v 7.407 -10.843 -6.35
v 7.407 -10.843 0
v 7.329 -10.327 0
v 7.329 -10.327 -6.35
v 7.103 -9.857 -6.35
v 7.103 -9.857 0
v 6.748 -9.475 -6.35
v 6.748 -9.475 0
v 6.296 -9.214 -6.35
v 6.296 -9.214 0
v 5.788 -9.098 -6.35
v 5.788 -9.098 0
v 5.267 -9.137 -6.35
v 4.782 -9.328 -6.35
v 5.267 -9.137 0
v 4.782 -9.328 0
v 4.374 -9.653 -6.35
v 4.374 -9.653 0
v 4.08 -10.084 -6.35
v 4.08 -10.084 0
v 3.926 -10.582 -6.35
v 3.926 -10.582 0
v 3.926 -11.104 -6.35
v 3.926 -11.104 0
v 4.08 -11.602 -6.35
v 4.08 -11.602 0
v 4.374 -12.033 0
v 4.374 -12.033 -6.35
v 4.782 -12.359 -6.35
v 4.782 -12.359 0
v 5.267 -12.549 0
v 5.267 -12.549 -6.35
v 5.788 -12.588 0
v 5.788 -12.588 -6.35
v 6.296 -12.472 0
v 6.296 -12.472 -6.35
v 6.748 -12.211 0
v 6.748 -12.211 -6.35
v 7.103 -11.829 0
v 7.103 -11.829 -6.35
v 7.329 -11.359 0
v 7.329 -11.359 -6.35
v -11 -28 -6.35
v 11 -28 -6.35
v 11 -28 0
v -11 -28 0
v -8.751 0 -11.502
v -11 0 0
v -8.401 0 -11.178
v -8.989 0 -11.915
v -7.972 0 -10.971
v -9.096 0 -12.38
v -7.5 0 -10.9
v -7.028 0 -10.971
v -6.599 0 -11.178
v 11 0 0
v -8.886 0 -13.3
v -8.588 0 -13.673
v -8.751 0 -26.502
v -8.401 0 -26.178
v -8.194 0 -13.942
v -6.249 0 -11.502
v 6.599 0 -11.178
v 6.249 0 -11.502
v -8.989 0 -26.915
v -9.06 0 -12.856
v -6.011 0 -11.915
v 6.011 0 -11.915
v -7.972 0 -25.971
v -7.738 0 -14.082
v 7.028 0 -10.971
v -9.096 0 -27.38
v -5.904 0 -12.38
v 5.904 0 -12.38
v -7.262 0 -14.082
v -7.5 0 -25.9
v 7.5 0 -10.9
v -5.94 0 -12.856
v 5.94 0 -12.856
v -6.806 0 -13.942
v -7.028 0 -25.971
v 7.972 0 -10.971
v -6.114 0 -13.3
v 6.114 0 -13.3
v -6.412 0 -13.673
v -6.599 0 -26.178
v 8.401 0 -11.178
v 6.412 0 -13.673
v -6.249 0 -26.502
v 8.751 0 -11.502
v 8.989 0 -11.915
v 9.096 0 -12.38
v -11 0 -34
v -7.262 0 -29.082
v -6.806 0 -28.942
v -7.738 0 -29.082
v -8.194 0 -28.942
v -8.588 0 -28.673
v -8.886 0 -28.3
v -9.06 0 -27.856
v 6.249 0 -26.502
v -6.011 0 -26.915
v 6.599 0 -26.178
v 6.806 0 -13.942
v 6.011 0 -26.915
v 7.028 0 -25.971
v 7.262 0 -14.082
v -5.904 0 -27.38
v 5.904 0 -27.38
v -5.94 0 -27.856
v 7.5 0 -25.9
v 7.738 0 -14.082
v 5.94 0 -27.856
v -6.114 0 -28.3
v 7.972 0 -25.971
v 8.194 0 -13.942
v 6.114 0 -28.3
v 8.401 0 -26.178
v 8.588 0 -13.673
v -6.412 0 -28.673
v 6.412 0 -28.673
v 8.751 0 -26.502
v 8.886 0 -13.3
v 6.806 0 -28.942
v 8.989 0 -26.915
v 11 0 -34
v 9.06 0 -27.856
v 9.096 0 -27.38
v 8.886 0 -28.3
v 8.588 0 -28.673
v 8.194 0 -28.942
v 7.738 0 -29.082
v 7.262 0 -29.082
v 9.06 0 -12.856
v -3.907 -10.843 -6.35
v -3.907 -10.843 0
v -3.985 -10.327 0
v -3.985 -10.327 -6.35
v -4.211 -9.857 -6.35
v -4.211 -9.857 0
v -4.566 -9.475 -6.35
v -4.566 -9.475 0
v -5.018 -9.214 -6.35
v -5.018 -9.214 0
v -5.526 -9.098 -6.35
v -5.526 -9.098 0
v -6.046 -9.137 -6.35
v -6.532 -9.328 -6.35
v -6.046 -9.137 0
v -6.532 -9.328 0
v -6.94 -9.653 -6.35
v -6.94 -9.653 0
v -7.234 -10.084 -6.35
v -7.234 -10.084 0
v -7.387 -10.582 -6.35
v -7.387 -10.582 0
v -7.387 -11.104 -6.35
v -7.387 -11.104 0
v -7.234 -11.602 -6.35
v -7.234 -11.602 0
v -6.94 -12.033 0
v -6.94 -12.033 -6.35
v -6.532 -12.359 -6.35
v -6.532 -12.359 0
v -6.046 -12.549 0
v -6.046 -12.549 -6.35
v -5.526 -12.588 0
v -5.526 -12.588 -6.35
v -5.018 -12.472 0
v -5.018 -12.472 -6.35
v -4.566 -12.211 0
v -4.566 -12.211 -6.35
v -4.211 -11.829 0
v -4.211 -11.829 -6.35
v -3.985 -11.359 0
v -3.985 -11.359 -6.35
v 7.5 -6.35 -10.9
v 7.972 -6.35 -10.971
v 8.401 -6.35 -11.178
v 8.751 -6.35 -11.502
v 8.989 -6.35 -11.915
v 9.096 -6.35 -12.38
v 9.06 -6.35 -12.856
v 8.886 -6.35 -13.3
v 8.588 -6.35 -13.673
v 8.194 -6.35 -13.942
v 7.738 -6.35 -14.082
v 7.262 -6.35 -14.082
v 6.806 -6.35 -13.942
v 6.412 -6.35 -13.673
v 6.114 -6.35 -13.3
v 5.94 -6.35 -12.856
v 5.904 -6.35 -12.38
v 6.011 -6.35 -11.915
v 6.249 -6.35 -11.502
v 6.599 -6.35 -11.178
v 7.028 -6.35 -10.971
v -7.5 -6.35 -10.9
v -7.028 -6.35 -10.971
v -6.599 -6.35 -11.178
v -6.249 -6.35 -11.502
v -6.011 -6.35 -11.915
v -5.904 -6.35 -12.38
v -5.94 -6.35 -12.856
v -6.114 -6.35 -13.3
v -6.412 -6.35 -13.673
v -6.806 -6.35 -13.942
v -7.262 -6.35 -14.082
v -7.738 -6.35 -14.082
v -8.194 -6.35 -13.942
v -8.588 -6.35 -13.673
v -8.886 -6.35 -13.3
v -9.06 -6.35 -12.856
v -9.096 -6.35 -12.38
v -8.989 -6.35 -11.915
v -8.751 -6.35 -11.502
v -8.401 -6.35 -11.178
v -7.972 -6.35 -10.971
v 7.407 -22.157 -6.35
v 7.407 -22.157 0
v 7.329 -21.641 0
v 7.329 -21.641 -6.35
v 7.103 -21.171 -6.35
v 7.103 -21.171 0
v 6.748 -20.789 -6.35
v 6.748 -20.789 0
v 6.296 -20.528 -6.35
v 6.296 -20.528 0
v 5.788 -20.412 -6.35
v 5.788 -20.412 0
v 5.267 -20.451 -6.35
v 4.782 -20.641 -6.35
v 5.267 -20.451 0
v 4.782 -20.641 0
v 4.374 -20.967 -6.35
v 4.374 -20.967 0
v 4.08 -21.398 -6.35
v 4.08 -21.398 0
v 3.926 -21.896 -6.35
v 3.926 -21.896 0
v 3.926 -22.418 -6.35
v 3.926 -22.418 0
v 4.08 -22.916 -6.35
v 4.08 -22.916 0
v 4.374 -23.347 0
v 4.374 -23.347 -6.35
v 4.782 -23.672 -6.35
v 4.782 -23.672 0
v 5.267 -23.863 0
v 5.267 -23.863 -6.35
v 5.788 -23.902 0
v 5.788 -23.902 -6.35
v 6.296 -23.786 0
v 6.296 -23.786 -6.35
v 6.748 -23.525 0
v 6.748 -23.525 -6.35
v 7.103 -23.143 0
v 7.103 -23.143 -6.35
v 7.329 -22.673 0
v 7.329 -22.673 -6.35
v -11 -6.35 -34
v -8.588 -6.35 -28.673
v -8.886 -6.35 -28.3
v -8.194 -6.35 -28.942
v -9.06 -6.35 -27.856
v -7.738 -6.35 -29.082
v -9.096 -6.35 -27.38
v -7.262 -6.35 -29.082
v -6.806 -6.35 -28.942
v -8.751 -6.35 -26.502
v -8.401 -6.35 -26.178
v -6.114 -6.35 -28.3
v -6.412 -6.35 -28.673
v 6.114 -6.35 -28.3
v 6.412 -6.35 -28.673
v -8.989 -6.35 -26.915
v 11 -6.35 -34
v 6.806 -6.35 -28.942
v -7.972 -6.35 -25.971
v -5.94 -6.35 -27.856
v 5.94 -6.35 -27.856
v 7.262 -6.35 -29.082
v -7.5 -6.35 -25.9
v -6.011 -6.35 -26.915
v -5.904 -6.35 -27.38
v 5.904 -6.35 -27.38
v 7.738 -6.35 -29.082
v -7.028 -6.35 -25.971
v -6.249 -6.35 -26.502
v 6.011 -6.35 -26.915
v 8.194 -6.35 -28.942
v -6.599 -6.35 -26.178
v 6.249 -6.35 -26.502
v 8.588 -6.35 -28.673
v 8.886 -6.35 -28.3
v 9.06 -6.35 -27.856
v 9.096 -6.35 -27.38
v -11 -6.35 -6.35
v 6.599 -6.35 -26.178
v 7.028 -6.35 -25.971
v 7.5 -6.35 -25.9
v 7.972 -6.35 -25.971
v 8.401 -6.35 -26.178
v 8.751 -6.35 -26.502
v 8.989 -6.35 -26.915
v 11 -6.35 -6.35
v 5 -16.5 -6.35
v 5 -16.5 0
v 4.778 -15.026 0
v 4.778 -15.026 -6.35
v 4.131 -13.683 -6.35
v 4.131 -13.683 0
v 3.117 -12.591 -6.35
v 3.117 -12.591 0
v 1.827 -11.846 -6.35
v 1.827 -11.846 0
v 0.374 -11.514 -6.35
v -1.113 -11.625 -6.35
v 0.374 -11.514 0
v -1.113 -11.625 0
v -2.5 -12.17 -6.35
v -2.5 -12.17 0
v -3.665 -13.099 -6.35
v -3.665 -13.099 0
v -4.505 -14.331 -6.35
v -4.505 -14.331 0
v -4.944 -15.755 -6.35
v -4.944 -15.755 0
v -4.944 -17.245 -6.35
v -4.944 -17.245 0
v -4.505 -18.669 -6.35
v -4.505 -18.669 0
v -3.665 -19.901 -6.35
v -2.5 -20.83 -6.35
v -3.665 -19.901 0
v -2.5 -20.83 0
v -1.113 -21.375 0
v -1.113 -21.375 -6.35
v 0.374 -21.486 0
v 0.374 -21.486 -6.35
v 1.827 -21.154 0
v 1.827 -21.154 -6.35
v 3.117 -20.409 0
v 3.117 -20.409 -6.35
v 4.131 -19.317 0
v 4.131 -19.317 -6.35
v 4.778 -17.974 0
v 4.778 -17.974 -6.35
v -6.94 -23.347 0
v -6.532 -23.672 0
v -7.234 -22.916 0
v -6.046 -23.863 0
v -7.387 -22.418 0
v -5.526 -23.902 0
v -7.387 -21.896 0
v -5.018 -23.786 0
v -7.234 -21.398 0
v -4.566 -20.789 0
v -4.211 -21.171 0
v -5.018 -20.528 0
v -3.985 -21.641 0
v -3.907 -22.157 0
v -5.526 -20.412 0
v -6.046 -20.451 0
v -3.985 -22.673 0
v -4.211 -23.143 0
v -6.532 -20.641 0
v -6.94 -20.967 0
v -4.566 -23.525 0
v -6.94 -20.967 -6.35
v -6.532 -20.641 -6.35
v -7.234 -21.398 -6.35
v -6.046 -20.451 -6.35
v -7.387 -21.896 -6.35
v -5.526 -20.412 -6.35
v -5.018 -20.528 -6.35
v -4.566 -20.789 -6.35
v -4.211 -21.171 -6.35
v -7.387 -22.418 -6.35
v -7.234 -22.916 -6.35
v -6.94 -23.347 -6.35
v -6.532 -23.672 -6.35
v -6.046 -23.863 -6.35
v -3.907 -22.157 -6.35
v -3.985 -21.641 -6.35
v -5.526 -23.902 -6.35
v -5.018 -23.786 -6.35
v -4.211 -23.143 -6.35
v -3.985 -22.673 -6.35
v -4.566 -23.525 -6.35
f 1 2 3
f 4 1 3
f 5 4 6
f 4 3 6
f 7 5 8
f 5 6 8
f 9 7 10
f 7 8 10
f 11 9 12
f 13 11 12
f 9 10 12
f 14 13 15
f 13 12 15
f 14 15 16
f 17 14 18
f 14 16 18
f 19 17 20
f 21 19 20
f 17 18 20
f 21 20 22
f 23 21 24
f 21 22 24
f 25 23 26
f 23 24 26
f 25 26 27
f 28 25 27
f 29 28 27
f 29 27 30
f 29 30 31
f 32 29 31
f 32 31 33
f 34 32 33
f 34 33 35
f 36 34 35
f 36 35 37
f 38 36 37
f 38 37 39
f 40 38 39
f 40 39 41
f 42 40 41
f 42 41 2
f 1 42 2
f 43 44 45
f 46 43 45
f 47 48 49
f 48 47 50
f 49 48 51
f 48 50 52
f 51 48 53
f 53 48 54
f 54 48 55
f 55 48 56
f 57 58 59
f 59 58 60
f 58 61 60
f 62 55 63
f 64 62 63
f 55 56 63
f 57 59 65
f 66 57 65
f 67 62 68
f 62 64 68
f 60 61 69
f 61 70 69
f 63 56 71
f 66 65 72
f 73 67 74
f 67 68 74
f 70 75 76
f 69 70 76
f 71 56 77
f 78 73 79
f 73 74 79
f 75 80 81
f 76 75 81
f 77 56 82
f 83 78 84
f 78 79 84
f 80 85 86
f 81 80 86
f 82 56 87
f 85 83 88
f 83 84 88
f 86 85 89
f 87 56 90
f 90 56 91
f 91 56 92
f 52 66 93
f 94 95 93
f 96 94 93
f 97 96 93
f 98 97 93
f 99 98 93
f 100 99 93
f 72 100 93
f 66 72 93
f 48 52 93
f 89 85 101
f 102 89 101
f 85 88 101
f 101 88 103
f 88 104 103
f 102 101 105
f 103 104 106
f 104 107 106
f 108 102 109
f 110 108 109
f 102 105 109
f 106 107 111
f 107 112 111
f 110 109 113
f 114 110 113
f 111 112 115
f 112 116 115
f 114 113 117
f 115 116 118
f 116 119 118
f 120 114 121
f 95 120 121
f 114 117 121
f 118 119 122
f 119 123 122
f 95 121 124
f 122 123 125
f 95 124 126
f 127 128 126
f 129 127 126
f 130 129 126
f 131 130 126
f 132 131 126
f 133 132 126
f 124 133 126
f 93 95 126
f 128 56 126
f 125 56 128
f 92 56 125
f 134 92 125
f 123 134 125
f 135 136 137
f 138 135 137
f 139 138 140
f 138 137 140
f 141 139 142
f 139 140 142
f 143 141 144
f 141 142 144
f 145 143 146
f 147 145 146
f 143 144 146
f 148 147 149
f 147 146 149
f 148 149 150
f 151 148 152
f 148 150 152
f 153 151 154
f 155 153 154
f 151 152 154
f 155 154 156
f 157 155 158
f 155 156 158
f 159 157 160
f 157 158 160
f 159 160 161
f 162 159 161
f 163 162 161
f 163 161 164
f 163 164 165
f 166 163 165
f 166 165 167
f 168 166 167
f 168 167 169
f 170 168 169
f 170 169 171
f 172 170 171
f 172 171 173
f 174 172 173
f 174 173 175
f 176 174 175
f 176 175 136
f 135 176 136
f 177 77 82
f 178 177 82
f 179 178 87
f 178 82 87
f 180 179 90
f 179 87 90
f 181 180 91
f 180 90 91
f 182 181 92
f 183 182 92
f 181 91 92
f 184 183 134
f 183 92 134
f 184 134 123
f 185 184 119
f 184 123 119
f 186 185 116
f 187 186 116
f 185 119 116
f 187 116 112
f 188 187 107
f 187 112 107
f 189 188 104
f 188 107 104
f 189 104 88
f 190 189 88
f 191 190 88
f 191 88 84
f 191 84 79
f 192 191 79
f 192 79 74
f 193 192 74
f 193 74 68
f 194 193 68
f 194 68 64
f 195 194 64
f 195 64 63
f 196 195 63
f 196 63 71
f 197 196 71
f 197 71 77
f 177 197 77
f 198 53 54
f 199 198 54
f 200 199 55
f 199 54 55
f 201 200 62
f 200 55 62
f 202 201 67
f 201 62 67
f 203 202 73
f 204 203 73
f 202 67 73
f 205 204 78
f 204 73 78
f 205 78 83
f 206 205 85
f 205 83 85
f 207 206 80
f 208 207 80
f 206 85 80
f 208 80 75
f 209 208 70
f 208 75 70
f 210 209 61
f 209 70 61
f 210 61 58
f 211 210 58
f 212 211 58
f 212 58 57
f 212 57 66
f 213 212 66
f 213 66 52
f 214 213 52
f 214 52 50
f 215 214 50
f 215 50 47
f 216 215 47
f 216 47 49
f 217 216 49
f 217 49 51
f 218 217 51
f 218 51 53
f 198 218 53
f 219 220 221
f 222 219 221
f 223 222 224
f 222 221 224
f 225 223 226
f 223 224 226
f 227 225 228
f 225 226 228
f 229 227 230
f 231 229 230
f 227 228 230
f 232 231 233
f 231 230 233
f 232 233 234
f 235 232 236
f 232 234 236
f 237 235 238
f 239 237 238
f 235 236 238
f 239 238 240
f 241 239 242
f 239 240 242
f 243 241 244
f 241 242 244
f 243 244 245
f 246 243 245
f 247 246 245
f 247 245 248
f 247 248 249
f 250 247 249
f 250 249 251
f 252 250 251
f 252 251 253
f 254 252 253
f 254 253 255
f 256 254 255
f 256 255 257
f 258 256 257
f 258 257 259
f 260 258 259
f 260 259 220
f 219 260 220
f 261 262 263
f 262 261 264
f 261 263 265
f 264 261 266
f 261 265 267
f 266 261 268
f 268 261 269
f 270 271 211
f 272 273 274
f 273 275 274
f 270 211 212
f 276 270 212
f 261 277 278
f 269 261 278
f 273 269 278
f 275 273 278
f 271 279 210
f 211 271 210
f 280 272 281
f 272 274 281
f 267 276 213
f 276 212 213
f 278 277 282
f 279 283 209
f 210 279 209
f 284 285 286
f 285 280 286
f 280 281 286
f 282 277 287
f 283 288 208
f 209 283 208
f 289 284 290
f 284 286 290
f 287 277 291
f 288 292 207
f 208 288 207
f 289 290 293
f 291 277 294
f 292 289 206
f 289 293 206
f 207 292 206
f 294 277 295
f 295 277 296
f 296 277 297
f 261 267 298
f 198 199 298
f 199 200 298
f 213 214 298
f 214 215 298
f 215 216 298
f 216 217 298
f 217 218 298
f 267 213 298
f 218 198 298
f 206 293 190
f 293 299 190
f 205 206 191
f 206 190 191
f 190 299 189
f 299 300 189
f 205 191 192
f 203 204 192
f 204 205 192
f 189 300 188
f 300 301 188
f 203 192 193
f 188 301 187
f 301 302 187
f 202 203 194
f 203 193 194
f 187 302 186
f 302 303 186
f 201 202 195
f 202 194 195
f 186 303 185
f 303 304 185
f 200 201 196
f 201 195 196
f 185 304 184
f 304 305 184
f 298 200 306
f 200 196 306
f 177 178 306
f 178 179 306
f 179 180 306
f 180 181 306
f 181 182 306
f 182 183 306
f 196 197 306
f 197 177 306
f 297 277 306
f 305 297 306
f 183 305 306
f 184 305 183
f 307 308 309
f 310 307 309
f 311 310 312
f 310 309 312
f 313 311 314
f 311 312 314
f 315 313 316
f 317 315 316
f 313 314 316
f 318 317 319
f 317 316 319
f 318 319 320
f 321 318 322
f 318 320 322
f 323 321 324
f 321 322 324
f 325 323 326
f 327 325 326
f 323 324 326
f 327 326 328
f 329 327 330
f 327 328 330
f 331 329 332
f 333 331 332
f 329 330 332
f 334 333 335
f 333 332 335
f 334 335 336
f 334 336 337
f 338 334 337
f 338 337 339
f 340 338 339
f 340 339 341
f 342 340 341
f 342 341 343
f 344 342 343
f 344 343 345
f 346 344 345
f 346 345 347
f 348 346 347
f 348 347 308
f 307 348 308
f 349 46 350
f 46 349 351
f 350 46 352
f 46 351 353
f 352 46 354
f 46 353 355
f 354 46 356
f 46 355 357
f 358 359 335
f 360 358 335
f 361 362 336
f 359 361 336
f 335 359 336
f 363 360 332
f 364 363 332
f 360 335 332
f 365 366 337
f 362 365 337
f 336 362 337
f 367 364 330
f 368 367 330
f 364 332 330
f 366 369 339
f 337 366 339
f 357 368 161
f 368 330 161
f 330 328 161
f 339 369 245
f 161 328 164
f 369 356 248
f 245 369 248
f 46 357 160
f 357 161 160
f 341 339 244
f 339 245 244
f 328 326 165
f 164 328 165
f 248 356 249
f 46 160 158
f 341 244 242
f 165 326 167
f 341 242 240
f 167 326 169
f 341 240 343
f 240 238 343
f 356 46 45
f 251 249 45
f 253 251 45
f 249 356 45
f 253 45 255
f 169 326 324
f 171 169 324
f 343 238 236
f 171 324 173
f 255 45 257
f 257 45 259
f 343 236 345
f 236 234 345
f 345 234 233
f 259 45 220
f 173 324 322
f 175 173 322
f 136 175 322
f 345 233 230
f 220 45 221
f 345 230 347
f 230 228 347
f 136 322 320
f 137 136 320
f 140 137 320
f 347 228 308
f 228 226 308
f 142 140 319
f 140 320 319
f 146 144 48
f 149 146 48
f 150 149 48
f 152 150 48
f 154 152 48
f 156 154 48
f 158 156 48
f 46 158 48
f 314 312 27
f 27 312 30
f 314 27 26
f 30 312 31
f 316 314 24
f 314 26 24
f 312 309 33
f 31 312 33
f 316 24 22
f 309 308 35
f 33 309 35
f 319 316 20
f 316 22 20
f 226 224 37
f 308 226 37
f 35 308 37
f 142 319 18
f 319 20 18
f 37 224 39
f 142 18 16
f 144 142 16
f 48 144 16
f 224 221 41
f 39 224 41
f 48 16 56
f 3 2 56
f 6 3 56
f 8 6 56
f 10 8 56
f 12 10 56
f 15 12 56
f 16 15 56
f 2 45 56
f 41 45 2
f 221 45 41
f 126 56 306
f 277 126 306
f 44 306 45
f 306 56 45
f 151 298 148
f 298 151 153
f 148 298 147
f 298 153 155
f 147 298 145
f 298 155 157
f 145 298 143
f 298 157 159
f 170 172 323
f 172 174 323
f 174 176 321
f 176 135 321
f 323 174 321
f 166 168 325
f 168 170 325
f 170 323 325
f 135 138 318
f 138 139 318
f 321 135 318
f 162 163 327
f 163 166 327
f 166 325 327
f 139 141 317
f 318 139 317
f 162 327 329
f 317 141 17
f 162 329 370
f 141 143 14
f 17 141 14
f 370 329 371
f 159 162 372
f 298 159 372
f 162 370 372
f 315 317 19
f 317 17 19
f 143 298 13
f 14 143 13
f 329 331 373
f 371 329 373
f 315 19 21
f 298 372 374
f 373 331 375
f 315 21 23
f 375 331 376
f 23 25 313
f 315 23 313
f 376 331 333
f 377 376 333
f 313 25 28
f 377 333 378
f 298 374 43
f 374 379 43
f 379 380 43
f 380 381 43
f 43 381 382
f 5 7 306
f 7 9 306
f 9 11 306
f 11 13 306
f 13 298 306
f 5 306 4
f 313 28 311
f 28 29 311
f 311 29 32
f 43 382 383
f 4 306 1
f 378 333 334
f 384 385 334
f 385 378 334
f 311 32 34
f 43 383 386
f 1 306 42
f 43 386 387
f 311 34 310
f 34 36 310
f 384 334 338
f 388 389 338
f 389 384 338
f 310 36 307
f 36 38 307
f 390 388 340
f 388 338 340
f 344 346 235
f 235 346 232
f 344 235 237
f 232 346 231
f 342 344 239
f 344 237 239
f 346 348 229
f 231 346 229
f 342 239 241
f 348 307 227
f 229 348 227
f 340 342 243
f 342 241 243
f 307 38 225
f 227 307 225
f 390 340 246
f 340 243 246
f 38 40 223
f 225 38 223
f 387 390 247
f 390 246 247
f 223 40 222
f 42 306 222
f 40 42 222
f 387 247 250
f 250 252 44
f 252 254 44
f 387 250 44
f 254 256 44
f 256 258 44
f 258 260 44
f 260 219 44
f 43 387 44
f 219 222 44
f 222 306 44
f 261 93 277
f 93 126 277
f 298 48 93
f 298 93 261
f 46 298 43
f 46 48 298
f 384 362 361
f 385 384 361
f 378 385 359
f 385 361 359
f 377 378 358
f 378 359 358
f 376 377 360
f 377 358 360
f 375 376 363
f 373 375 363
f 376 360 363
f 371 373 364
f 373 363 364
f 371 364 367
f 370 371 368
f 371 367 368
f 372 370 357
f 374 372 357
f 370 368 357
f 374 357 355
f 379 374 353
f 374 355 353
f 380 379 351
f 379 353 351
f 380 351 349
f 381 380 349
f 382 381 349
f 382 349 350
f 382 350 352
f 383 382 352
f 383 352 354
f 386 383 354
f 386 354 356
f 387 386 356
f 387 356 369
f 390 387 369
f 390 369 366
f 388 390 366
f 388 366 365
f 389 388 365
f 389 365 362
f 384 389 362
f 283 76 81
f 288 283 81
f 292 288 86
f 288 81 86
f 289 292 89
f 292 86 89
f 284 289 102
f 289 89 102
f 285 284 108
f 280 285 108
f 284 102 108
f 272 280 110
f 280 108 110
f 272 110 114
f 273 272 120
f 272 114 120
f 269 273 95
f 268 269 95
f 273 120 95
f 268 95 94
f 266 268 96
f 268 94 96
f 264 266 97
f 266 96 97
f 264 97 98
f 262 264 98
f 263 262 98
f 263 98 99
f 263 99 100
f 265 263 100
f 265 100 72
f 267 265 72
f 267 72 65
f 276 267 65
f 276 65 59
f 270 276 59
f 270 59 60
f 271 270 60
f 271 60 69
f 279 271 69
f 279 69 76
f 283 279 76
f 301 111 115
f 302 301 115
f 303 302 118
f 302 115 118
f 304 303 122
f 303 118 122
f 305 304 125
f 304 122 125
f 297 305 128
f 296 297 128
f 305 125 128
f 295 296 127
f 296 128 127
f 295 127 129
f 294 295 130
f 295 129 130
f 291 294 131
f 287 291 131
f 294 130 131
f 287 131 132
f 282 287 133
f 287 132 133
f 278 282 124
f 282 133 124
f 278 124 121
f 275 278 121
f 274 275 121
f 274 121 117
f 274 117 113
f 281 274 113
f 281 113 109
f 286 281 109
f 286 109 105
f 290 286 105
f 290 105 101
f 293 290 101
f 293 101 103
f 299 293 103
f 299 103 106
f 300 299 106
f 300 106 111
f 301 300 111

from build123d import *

# Parameters (mm, degrees)
PAD_DEPTH         = 11
SKETCH002_R       = 5
SKETCH002_R_2     = 1.75
POCKET_DEPTH      = 34.001
POCKET_DEPTH_BACK = 0.001
SKETCH003_R       = 1.6
HOLE_DEPTH        = 28.001


with BuildPart() as part:
    # Sketch → Pad (new body, symmetric)
    with BuildSketch(Plane.YZ):
        Polygon((-28, 0), (0, 0), (0, -34), (-6.35, -34), (-6.35, -6.35), (-28, -6.35), align=None)
    extrude(amount=PAD_DEPTH, both=True)

    # Sketch002 → Pocket (cut, two sides)
    with BuildSketch(Plane.XY) as pocket_sk:
        with Locations((0, -16.5)):
            Circle(SKETCH002_R)
        with Locations((-5.656854, -22.156854)):
            Circle(SKETCH002_R_2)
        with Locations((5.656854, -22.156854)):
            Circle(SKETCH002_R_2)
        with Locations((5.656854, -10.843146)):
            Circle(SKETCH002_R_2)
        with Locations((-5.656854, -10.843146)):
            Circle(SKETCH002_R_2)
    extrude(amount=-POCKET_DEPTH, mode=Mode.SUBTRACT)
    extrude(pocket_sk.sketch, amount=POCKET_DEPTH_BACK, mode=Mode.SUBTRACT)

    # Sketch003 (on Face5 of Pocket) → Hole (cut, through all)
    with BuildSketch(Plane.ZX):
        with Locations((-27.5, 7.5)):
            Circle(SKETCH003_R)
        with Locations((-12.5, 7.5)):
            Circle(SKETCH003_R)
        with Locations((-12.5, -7.5)):
            Circle(SKETCH003_R)
        with Locations((-27.5, -7.5)):
            Circle(SKETCH003_R)
    extrude(amount=-HOLE_DEPTH, mode=Mode.SUBTRACT)


solid = part.part
